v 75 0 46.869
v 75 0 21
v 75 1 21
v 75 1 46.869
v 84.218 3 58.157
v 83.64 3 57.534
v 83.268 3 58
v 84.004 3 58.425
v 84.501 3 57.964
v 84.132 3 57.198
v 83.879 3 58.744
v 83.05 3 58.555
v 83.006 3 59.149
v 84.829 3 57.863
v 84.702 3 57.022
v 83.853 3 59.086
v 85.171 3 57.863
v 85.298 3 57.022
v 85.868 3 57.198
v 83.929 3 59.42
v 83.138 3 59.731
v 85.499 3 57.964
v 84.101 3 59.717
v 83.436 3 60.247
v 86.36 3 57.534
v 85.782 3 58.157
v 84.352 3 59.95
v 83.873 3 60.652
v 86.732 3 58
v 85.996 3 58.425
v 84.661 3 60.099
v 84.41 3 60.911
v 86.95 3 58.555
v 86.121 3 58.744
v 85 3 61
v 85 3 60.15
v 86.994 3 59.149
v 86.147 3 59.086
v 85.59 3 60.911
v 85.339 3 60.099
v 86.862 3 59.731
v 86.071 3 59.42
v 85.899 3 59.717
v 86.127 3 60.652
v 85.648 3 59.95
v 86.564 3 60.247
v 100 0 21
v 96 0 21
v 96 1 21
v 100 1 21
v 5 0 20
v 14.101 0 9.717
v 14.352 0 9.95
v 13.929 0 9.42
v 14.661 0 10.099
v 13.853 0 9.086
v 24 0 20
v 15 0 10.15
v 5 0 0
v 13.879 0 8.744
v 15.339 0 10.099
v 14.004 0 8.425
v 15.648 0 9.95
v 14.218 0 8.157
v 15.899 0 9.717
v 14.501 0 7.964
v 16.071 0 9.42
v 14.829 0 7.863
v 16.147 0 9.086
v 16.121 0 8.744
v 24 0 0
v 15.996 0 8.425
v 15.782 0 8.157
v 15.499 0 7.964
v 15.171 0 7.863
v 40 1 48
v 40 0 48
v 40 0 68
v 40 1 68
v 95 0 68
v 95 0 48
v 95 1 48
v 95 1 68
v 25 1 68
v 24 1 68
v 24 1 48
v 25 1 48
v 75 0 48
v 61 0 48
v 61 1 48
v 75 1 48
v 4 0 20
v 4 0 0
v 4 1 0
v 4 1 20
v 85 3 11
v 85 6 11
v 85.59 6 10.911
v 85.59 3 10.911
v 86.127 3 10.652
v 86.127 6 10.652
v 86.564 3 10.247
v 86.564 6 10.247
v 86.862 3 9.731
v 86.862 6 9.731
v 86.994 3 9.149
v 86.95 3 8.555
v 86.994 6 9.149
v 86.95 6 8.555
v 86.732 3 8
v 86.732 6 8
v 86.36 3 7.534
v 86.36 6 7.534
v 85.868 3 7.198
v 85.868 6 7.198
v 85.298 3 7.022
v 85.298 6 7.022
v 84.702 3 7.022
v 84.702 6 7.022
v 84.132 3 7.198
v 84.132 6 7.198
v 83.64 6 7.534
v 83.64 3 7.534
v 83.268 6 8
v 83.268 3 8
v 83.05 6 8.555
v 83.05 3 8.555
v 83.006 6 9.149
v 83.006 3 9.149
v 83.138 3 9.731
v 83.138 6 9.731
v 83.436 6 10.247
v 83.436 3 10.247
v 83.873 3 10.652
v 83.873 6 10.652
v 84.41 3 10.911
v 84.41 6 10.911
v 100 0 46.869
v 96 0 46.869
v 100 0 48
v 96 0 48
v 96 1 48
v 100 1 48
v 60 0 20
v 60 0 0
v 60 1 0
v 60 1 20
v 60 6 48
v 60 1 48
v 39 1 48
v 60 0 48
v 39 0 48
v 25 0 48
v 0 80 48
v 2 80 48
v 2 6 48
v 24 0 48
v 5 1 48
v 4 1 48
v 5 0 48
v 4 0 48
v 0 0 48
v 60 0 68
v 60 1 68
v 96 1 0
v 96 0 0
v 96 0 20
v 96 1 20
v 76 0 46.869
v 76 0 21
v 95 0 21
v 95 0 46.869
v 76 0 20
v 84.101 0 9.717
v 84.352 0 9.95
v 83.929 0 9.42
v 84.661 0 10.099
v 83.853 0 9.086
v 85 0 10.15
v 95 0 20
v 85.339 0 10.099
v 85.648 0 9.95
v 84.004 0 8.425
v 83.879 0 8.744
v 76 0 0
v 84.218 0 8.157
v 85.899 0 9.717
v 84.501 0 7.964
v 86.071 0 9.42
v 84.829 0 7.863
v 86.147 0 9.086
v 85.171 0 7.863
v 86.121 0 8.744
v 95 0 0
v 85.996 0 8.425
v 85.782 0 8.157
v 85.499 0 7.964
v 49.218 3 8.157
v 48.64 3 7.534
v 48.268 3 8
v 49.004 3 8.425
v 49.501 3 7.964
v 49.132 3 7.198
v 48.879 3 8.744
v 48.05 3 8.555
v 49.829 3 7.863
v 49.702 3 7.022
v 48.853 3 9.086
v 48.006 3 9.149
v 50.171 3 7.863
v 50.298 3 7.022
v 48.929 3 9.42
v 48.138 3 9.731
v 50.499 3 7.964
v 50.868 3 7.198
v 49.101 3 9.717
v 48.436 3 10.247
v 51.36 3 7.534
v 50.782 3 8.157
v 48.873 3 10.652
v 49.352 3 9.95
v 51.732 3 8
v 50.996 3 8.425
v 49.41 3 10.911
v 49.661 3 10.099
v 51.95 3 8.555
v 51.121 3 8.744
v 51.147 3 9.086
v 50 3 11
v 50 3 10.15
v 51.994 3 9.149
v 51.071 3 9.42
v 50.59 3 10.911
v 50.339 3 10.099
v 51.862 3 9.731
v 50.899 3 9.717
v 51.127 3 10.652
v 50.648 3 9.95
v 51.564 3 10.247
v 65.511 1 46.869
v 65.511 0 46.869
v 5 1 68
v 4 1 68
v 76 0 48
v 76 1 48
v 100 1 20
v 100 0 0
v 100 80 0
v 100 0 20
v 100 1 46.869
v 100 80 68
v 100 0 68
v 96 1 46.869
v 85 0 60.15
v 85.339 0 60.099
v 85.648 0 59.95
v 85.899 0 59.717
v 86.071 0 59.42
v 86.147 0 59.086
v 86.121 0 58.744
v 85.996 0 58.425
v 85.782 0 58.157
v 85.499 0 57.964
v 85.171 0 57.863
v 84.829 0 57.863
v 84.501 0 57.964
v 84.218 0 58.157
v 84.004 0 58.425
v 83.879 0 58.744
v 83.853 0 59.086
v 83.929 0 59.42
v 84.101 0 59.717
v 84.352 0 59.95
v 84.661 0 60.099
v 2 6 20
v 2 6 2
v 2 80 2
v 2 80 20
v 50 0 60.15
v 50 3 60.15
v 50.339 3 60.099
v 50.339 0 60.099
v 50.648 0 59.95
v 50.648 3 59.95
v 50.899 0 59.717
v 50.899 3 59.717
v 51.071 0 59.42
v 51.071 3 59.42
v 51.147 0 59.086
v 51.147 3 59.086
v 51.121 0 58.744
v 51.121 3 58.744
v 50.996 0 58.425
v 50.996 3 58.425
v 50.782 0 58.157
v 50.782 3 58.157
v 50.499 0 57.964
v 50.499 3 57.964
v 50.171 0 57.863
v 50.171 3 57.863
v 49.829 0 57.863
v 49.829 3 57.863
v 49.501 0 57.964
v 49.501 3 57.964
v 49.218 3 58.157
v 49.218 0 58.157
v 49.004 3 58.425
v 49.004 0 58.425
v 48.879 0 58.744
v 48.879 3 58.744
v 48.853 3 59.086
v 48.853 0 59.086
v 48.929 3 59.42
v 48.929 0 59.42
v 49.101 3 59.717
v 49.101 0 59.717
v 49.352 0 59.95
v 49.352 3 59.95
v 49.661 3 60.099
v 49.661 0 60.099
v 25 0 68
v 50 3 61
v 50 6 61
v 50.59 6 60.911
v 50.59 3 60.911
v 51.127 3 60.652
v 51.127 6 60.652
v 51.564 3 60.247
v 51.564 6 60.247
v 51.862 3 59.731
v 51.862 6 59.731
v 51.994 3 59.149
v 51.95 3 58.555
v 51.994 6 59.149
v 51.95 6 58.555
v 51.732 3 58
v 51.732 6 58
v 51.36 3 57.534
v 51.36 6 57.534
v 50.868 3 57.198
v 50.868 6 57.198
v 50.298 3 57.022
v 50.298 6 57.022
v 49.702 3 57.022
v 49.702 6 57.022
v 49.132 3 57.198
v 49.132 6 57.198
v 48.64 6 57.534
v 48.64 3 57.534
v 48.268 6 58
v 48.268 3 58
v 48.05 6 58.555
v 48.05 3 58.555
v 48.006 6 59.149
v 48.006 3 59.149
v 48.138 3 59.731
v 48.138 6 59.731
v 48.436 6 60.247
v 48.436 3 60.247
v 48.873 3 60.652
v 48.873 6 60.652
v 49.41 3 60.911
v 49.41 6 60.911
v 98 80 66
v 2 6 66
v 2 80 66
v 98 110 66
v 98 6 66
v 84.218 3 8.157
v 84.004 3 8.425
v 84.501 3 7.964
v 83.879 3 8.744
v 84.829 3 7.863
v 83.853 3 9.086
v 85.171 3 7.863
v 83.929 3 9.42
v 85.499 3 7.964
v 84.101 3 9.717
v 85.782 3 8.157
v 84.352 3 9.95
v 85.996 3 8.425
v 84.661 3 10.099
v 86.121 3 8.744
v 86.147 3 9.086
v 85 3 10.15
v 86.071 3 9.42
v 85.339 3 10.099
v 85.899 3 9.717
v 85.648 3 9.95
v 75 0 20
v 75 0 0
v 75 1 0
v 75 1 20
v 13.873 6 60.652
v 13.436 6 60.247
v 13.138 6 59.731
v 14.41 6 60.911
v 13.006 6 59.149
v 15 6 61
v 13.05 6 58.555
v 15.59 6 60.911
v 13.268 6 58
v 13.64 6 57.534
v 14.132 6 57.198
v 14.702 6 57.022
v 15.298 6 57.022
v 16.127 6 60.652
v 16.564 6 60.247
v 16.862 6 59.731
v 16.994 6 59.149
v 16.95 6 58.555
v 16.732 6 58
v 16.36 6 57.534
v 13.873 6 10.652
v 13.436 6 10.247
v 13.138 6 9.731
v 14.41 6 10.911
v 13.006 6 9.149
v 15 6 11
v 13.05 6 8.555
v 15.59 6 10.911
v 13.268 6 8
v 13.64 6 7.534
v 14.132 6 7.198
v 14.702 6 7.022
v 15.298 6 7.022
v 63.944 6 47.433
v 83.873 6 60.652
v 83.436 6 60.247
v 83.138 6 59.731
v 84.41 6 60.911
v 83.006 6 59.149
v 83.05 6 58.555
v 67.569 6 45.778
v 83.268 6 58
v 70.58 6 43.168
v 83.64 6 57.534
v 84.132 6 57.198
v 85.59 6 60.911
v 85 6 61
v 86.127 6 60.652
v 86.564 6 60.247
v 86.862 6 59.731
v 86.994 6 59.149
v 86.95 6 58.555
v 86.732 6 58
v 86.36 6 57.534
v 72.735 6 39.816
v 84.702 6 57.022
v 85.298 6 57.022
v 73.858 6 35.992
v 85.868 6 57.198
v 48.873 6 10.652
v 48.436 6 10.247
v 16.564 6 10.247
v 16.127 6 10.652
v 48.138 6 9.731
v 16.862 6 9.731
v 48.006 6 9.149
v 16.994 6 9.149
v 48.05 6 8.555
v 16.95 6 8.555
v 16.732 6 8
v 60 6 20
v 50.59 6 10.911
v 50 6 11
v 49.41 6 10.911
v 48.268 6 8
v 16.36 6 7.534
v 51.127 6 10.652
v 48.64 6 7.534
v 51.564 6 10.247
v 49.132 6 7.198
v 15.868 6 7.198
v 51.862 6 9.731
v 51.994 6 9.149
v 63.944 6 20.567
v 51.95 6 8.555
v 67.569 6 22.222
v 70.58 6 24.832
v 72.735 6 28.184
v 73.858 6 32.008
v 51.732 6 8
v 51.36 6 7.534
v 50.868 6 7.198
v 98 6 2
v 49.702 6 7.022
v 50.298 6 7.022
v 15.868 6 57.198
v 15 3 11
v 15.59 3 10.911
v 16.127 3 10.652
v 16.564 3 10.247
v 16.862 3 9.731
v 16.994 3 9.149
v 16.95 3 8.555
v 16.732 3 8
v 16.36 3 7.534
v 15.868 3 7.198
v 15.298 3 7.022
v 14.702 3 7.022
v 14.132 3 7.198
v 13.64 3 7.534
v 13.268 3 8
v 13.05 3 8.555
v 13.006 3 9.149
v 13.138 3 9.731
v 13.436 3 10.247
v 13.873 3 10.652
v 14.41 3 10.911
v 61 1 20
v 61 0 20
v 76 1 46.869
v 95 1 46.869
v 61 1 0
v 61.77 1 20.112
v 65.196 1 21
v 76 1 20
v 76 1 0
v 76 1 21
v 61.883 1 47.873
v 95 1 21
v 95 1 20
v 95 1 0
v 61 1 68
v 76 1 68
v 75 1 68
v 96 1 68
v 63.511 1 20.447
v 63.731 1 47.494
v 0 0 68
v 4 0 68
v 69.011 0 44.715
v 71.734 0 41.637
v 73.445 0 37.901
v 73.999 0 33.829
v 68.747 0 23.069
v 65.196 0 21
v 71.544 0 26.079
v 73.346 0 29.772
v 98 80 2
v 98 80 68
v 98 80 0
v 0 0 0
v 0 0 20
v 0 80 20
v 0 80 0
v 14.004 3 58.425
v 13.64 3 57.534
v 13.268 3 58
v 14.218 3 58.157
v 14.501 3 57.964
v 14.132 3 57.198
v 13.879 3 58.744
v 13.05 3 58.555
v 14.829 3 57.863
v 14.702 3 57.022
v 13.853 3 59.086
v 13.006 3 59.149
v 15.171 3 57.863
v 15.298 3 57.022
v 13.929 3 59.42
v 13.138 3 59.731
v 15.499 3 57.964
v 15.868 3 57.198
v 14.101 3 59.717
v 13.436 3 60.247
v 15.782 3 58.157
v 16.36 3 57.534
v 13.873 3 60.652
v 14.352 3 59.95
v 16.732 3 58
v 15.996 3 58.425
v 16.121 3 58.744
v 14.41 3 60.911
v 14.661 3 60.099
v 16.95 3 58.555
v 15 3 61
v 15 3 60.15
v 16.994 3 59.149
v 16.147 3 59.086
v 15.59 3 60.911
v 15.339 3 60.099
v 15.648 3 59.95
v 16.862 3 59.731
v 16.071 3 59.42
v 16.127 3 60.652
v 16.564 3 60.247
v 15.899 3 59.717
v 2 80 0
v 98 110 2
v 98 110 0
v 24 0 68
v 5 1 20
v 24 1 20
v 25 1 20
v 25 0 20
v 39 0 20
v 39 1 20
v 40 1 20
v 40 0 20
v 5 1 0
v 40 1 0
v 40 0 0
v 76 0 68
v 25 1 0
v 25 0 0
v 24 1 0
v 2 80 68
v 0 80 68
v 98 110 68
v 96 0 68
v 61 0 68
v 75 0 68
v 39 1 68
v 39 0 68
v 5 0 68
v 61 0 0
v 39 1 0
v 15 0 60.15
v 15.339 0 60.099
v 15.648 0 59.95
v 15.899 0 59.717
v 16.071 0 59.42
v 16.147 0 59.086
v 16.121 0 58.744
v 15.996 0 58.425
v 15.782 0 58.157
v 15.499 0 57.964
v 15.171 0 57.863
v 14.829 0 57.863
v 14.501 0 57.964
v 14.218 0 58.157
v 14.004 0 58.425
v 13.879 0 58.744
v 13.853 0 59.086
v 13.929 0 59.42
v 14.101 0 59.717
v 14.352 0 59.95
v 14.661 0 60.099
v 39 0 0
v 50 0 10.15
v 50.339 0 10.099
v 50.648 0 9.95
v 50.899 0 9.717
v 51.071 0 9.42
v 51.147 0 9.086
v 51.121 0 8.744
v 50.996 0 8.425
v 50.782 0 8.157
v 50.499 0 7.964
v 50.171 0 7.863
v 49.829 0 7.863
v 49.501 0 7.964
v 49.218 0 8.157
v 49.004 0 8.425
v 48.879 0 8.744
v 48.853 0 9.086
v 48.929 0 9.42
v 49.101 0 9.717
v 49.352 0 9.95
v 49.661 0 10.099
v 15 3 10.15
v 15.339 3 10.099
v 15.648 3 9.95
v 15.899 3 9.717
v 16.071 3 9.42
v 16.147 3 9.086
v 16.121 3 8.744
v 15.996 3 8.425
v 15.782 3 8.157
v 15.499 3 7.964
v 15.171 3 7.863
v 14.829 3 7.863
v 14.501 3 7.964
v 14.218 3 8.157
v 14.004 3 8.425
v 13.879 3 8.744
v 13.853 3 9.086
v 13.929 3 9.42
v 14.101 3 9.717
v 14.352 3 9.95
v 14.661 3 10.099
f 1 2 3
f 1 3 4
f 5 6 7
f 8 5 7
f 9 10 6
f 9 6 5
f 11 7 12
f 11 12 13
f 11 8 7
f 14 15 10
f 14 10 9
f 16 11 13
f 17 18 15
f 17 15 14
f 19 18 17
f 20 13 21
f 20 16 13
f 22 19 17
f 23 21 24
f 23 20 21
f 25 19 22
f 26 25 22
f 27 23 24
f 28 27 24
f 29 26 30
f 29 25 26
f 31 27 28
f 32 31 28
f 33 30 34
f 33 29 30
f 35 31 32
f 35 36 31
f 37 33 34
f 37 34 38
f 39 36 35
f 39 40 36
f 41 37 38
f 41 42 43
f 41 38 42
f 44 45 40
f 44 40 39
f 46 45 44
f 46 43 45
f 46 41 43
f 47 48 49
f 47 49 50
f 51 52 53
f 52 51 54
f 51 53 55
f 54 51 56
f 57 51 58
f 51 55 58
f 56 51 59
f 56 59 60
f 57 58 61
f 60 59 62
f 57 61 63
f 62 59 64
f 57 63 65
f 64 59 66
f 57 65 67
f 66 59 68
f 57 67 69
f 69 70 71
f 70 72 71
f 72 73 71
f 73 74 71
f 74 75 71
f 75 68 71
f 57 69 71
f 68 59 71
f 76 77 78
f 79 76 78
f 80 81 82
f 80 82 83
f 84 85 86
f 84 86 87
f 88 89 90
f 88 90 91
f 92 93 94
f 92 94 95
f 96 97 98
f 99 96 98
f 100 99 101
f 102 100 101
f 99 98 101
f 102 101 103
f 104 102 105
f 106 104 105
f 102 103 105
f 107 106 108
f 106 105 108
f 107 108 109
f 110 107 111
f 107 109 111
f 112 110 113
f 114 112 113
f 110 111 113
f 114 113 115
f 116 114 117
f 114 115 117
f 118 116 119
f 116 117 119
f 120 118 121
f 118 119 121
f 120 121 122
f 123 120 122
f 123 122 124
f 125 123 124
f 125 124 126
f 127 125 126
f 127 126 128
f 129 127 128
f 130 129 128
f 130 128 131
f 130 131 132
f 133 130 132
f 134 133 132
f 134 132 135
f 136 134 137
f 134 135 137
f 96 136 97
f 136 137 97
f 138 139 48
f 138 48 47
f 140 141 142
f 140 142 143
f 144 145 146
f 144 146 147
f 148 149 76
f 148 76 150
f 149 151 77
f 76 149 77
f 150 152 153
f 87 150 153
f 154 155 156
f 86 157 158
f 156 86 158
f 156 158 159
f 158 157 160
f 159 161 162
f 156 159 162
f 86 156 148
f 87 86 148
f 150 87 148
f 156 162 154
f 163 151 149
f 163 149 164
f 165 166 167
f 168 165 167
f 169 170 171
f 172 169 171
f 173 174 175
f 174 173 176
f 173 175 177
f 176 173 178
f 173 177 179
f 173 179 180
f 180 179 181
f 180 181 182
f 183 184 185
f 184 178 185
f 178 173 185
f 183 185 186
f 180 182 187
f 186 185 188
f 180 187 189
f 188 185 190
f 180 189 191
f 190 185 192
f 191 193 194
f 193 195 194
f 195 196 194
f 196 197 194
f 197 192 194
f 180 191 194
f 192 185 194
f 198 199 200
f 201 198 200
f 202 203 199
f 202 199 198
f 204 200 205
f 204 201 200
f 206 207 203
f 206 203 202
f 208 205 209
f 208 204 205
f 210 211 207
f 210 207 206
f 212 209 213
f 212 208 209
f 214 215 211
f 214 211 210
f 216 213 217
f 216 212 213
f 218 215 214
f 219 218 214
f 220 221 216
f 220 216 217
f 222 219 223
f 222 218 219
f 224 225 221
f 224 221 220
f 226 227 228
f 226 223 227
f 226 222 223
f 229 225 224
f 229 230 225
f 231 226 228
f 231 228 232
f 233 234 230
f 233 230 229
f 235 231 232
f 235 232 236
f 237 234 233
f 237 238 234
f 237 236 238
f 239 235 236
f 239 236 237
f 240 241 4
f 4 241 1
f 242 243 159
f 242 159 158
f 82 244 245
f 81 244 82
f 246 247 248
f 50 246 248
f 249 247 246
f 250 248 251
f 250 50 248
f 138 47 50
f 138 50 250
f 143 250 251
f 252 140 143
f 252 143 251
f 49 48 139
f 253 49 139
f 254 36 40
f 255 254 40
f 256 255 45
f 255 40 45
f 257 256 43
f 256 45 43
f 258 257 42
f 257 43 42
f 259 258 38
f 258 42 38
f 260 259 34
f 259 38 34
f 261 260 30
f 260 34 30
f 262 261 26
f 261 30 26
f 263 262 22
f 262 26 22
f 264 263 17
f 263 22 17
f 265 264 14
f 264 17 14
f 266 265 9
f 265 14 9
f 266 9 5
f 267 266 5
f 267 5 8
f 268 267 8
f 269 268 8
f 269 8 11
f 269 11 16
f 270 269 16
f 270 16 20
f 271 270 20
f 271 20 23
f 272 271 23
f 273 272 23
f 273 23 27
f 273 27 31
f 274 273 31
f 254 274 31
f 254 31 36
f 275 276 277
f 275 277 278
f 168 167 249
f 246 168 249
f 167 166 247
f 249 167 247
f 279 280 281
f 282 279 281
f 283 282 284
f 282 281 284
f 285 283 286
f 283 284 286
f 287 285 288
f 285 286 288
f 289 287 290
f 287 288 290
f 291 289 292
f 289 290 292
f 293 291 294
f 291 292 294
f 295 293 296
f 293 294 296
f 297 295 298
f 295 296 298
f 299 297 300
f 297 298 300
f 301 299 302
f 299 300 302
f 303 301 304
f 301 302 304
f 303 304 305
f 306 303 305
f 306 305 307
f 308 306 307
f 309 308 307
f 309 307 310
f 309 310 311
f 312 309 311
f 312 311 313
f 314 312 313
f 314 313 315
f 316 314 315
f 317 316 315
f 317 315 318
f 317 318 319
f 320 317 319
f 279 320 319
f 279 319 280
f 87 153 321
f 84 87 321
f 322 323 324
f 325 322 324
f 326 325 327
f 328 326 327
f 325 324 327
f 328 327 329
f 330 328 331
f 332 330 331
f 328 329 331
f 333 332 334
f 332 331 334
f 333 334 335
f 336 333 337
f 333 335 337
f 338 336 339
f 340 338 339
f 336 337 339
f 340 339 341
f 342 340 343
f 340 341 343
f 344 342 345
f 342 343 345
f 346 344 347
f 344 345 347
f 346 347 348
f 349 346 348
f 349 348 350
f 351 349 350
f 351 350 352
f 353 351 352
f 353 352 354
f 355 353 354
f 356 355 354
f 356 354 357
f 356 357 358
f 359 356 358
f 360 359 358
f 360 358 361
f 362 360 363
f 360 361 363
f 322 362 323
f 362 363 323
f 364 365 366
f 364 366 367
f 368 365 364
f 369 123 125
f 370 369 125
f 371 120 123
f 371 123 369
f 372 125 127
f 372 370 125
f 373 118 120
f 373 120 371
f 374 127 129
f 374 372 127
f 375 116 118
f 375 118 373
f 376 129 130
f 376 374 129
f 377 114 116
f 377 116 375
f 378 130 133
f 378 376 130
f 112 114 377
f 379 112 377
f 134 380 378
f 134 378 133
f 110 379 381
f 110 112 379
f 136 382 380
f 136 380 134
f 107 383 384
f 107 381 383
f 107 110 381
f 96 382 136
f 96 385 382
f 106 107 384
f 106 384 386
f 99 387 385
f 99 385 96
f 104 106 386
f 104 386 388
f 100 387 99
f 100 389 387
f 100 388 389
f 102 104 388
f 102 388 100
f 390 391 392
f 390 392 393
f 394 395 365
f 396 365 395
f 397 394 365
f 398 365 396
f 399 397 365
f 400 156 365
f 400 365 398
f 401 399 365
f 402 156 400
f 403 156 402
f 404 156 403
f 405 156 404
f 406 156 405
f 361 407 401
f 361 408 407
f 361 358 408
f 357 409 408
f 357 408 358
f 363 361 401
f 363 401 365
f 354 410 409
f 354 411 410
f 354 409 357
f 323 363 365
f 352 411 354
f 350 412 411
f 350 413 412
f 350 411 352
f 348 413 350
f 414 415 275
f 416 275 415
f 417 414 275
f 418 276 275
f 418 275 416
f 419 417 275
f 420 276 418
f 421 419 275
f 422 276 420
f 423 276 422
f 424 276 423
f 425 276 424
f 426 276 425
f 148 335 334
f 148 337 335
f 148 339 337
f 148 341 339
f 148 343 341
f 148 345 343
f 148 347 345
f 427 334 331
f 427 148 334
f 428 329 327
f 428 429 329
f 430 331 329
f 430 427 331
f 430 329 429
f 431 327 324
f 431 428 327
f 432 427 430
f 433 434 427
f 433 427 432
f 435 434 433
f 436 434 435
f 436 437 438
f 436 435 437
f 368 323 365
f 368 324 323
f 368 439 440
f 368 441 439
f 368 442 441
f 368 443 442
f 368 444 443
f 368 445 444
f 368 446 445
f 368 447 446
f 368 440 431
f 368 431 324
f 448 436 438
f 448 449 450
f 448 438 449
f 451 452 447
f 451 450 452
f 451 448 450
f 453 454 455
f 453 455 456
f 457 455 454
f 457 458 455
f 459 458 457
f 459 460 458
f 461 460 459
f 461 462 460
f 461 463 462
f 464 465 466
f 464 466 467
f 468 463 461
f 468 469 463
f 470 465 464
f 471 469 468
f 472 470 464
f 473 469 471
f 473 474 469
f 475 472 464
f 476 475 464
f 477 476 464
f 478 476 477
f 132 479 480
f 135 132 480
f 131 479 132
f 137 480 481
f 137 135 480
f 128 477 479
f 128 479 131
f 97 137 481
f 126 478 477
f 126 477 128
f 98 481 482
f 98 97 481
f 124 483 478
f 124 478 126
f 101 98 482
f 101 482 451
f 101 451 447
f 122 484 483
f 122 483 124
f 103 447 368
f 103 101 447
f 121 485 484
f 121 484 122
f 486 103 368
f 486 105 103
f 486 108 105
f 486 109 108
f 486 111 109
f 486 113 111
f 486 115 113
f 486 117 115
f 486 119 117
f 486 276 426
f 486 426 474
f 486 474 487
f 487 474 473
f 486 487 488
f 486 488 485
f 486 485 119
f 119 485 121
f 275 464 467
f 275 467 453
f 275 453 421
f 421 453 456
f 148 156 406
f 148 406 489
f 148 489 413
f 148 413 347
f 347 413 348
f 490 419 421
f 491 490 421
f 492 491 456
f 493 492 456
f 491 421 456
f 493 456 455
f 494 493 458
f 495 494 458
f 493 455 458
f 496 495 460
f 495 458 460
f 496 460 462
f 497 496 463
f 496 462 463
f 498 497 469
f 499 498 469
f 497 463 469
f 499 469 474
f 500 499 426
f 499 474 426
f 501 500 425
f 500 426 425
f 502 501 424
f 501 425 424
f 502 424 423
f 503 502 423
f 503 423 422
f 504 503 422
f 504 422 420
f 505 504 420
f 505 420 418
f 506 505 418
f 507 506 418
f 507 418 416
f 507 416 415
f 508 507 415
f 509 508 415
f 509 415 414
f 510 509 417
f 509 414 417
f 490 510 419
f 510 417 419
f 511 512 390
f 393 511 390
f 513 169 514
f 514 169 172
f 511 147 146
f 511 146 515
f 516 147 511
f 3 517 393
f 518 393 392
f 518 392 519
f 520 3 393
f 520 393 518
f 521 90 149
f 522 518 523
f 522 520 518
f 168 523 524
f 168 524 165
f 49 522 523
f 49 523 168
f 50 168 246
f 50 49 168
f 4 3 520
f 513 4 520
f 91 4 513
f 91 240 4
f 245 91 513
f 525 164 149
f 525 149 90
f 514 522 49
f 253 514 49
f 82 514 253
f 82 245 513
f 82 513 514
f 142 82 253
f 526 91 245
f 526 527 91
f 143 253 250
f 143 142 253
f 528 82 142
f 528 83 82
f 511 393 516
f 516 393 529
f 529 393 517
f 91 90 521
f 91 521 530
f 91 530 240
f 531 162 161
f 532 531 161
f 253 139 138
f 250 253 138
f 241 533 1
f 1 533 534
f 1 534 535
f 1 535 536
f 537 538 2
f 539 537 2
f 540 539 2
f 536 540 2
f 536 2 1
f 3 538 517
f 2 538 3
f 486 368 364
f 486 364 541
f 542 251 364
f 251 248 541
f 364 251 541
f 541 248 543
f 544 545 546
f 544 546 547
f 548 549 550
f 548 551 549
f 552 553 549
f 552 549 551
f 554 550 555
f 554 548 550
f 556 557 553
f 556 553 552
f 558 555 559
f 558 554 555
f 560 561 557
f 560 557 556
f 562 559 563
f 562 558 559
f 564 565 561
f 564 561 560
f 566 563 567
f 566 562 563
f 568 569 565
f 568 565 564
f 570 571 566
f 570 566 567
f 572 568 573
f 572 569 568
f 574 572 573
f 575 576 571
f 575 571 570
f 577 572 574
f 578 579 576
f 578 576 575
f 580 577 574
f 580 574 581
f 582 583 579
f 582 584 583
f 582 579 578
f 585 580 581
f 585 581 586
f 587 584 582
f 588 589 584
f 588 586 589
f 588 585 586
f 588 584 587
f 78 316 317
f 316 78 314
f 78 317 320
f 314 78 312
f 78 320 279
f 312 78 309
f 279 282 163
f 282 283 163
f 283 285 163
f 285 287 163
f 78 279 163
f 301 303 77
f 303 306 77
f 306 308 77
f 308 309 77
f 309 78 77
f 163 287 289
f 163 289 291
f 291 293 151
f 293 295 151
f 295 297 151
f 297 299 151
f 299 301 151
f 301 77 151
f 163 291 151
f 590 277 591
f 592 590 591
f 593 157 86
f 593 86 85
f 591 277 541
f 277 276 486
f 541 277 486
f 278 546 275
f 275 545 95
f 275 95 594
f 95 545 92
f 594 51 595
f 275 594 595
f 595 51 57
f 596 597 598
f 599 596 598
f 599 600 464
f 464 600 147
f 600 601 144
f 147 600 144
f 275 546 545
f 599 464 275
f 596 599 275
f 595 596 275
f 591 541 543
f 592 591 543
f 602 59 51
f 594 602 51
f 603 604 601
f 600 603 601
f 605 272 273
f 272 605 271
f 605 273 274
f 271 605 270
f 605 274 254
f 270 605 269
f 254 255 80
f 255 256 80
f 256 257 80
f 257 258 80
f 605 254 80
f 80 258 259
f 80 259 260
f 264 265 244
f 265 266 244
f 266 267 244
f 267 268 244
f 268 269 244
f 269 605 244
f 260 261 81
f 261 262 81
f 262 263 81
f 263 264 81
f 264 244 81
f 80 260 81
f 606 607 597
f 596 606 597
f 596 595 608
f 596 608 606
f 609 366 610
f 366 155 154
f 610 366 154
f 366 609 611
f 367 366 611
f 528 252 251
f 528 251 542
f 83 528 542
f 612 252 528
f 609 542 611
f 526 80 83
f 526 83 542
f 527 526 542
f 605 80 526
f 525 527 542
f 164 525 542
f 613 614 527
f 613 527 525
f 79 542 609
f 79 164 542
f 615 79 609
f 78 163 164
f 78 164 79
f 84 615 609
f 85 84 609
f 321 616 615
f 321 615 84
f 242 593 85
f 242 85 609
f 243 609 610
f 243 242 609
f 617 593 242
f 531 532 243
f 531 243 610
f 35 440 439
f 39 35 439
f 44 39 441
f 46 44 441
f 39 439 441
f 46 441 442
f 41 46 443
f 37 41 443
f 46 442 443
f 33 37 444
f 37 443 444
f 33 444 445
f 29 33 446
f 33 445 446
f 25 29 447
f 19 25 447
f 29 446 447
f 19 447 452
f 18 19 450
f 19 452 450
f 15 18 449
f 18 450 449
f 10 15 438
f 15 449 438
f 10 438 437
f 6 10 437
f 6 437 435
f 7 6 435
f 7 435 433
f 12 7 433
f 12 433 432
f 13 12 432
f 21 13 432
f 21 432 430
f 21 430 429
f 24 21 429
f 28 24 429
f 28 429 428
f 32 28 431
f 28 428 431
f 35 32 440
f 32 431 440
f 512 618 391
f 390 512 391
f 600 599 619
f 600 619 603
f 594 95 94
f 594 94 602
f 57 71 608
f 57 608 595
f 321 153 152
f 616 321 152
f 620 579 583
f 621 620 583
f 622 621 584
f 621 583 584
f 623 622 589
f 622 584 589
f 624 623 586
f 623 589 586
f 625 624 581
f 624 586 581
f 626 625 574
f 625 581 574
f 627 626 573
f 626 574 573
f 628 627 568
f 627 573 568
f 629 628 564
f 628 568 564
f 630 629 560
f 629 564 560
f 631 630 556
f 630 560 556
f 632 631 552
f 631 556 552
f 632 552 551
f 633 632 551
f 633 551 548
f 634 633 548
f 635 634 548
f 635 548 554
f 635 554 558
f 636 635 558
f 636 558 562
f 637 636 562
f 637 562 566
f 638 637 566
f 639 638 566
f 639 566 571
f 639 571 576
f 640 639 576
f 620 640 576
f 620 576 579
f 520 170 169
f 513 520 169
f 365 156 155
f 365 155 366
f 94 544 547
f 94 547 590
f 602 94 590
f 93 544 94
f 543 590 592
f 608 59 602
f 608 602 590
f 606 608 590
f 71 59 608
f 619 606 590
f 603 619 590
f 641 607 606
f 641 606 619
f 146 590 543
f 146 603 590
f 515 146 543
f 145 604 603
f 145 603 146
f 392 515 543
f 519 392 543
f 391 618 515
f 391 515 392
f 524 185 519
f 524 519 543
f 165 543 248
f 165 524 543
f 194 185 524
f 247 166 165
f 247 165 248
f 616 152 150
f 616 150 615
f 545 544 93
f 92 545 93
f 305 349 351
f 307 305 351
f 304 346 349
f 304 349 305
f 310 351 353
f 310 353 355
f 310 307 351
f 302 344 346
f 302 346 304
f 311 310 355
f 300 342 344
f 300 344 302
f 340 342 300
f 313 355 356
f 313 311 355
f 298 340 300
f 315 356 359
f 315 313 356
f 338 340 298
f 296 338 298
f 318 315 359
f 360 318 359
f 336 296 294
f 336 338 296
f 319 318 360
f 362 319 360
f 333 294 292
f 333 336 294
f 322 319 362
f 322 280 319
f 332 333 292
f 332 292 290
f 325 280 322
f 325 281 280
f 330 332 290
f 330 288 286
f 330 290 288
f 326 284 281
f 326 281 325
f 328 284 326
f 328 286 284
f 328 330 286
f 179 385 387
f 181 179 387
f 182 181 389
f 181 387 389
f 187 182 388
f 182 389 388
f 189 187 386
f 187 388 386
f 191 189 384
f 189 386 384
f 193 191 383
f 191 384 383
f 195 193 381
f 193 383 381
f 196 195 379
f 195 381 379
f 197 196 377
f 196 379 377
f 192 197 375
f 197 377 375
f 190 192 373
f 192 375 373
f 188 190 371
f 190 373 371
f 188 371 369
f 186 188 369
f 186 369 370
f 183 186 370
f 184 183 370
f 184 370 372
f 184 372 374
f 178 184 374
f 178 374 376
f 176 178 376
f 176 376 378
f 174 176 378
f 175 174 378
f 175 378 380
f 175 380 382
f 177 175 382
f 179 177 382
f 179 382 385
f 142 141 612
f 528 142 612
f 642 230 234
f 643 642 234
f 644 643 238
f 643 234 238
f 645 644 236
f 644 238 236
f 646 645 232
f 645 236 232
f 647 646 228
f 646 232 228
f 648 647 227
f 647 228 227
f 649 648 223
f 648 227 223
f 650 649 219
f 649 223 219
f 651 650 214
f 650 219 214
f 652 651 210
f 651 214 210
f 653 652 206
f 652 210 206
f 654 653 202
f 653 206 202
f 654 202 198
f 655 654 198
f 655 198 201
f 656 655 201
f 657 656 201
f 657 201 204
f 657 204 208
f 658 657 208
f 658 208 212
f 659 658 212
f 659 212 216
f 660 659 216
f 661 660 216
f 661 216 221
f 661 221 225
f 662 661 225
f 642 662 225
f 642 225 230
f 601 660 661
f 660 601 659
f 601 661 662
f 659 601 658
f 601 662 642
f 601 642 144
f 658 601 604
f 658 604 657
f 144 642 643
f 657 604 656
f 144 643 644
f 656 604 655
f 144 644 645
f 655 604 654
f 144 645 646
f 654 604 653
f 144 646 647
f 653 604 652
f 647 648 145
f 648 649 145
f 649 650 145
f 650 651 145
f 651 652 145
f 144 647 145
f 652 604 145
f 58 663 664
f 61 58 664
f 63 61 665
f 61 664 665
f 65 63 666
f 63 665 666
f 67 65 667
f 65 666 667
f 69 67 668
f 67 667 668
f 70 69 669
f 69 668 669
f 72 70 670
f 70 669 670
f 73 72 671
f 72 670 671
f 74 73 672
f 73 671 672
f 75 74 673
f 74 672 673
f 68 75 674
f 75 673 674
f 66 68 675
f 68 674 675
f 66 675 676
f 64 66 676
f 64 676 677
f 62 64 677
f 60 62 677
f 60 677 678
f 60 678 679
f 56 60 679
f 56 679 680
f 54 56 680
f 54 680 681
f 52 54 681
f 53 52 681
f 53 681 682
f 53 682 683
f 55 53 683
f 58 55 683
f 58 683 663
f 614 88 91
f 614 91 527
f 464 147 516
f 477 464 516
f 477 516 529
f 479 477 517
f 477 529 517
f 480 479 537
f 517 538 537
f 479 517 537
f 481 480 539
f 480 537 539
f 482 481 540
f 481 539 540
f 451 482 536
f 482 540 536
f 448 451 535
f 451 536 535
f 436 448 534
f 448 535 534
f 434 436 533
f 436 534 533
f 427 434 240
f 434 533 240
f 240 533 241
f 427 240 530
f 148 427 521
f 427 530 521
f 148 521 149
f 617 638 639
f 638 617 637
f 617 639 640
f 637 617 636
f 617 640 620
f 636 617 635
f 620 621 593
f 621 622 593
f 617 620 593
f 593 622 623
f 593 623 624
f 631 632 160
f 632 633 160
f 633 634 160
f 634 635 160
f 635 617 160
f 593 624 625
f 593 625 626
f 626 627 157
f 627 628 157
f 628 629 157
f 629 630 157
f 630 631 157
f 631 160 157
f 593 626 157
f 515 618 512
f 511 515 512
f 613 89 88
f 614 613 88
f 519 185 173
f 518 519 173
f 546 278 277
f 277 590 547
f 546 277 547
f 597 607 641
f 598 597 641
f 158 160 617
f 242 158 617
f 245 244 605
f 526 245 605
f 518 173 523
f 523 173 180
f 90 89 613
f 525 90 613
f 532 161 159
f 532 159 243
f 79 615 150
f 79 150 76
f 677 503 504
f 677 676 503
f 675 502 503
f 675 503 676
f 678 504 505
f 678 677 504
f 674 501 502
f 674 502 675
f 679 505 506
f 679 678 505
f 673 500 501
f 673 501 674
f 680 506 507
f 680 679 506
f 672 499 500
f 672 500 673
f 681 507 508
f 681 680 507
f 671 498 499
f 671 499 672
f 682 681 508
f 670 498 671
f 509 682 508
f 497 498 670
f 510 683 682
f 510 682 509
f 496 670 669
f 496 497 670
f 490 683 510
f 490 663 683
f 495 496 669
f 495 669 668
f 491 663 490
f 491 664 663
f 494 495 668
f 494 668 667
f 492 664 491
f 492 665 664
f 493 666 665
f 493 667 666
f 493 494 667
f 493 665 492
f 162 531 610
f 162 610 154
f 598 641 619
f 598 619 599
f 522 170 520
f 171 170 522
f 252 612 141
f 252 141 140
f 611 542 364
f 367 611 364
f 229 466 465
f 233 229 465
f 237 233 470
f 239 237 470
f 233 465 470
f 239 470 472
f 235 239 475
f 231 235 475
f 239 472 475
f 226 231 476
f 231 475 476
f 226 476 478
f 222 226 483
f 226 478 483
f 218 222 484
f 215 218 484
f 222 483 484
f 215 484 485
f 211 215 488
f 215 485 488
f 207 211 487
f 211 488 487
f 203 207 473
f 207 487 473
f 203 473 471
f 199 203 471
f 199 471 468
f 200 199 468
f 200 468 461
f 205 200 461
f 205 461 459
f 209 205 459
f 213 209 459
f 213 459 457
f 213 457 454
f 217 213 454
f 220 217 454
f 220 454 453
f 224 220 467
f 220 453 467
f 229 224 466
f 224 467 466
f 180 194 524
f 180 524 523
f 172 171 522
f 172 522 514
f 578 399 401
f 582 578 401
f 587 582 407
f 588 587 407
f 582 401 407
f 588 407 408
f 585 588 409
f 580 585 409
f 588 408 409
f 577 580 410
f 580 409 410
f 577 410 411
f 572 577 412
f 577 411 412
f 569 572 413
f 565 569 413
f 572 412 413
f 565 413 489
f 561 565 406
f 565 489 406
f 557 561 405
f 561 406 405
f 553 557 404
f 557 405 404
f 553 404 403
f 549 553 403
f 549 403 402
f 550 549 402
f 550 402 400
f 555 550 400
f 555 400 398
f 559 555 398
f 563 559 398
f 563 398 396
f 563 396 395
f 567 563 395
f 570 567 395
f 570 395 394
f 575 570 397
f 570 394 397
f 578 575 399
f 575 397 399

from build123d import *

# Parameters (mm, degrees)
EXTRUDE_1_DEPTH     = 3
EXTRUDE_2_DEPTH     = 77
SKETCH_3_W          = 96
SKETCH_3_H          = 2
EXTRUDE_3_DEPTH     = 30
CUT_EXTRUDE_1_DEPTH = 164.474768695
EXTRUDE_4_DEPTH     = 3
SKETCH_8_R          = 2
CUT_EXTRUDE_2_DEPTH = 3
SKETCH_9_R          = 1.15
CUT_EXTRUDE_3_DEPTH = 23
SKETCH_10_W         = 1
SKETCH_10_H         = 68
CUT_EXTRUDE_4_DEPTH = 1
SKETCH_11_W         = 100
SKETCH_11_H         = 1.130513839
SKETCH_11_H_2       = 1
CUT_EXTRUDE_5_DEPTH = 1


with BuildPart() as part:
    # 草图1 → 凸台-拉伸1 (new body)
    with BuildSketch(Plane(origin=(0, 0, 0), x_dir=(1, 0, 0), z_dir=(0, 1, 0))):
        with BuildLine():
            Line((0, 0), (0, -20))
            Line((0, -20), (60, -20))
            ThreePointArc((60, -20), (74, -34), (60, -48))
            Line((60, -48), (0, -48))
            Line((0, -48), (0, -68))
            Line((0, -68), (100, -68))
            Line((100, -68), (100, 0))
            Line((100, 0), (0, 0))
        make_face()
    extrude(amount=EXTRUDE_1_DEPTH)

    # 草图2 → 凸台-拉伸2 (add)
    with BuildSketch(Plane(origin=(0, 3, 0), x_dir=(1, 0, 0), z_dir=(0, 1, 0))):
        Polygon((2, -20), (0, -20), (0, 0), (100, 0), (100, -68), (0, -68), (0, -48), (2, -48), (2, -66), (98, -66), (98, -2), (2, -2), align=None)
    extrude(amount=EXTRUDE_2_DEPTH)

    # 草图3 → 凸台-拉伸3 (add)
    with BuildSketch(Plane(origin=(0, 80, 0), x_dir=(1, 0, 0), z_dir=(0, 1, 0))):
        with Locations((50, -1)):
            Rectangle(SKETCH_3_W, SKETCH_3_H)
        with Locations((50, -67)):
            Rectangle(SKETCH_3_W, SKETCH_3_H)
    extrude(amount=EXTRUDE_3_DEPTH)

    # 草图6 → 切除-拉伸1 (cut, through all)
    with BuildSketch(Plane.XY.offset(68)):
        Polygon((2, 110), (2, 80), (98, 110), align=None)
    extrude(amount=-CUT_EXTRUDE_1_DEPTH, mode=Mode.SUBTRACT)

    # 草图7 → 凸台-拉伸4 (add)
    with BuildSketch(Plane(origin=(0, 3, 0), x_dir=(1, 0, 0), z_dir=(0, 1, 0))):
        with BuildLine():
            Line((98, -2), (2, -2))
            Line((2, -2), (2, -20))
            Line((2, -20), (60, -20))
            ThreePointArc((60, -20), (74, -34), (60, -48))
            Line((60, -48), (2, -48))
            Line((2, -48), (2, -66))
            Line((2, -66), (98, -66))
            Line((98, -66), (98, -2))
        make_face()
    extrude(amount=EXTRUDE_4_DEPTH)

    # 草图8 → 切除-拉伸2 (cut)
    with BuildSketch(Plane(origin=(0, 6, 0), x_dir=(1, 0, 0), z_dir=(0, 1, 0))):
        with Locations(Location((15, -9, 0), (0, 0, 270))):
            Circle(SKETCH_8_R)
        with Locations(Location((50, -9, 0), (0, 0, 270))):
            Circle(SKETCH_8_R)
        with Locations(Location((85, -9, 0), (0, 0, 270))):
            Circle(SKETCH_8_R)
        with Locations(Location((15, -59, 0), (0, 0, 270))):
            Circle(SKETCH_8_R)
        with Locations(Location((50, -59, 0), (0, 0, 270))):
            Circle(SKETCH_8_R)
        with Locations(Location((85, -59, 0), (0, 0, 270))):
            Circle(SKETCH_8_R)
    extrude(amount=-CUT_EXTRUDE_2_DEPTH, mode=Mode.SUBTRACT)

    # 草图9 → 切除-拉伸3 (cut)
    with BuildSketch(Plane(origin=(0, 6, 0), x_dir=(1, 0, 0), z_dir=(0, 1, 0))):
        with Locations(Location((15, -9, 0), (0, 0, 270))):
            Circle(SKETCH_9_R)
        with Locations(Location((50, -9, 0), (0, 0, 270))):
            Circle(SKETCH_9_R)
        with Locations(Location((85, -9, 0), (0, 0, 270))):
            Circle(SKETCH_9_R)
        with Locations(Location((85, -59, 0), (0, 0, 270))):
            Circle(SKETCH_9_R)
        with Locations(Location((50, -59, 0), (0, 0, 270))):
            Circle(SKETCH_9_R)
        with Locations(Location((15, -59, 0), (0, 0, 270))):
            Circle(SKETCH_9_R)
    extrude(amount=-CUT_EXTRUDE_3_DEPTH, mode=Mode.SUBTRACT)

    # 草图10 → 切除-拉伸4 (cut)
    with BuildSketch(Plane.XZ):
        with Locations((24.5, 34)):
            Rectangle(SKETCH_10_W, SKETCH_10_H)
        with Locations((39.5, 34)):
            Rectangle(SKETCH_10_W, SKETCH_10_H)
        with Locations((60.5, 34)):
            Rectangle(SKETCH_10_W, SKETCH_10_H)
        with Locations((75.5, 34)):
            Rectangle(SKETCH_10_W, SKETCH_10_H)
        with Locations((95.5, 34)):
            Rectangle(SKETCH_10_W, SKETCH_10_H)
        with Locations((4.5, 34)):
            Rectangle(SKETCH_10_W, SKETCH_10_H)
    extrude(amount=-CUT_EXTRUDE_4_DEPTH, mode=Mode.SUBTRACT)

    # 草图11 → 切除-拉伸5 (cut)
    with BuildSketch(Plane.XZ):
        with Locations((50, 47.43474308)):
            Rectangle(SKETCH_11_W, SKETCH_11_H)
        with Locations((50, 20.5)):
            Rectangle(SKETCH_11_W, SKETCH_11_H_2)
    extrude(amount=-CUT_EXTRUDE_5_DEPTH, mode=Mode.SUBTRACT)


solid = part.part
